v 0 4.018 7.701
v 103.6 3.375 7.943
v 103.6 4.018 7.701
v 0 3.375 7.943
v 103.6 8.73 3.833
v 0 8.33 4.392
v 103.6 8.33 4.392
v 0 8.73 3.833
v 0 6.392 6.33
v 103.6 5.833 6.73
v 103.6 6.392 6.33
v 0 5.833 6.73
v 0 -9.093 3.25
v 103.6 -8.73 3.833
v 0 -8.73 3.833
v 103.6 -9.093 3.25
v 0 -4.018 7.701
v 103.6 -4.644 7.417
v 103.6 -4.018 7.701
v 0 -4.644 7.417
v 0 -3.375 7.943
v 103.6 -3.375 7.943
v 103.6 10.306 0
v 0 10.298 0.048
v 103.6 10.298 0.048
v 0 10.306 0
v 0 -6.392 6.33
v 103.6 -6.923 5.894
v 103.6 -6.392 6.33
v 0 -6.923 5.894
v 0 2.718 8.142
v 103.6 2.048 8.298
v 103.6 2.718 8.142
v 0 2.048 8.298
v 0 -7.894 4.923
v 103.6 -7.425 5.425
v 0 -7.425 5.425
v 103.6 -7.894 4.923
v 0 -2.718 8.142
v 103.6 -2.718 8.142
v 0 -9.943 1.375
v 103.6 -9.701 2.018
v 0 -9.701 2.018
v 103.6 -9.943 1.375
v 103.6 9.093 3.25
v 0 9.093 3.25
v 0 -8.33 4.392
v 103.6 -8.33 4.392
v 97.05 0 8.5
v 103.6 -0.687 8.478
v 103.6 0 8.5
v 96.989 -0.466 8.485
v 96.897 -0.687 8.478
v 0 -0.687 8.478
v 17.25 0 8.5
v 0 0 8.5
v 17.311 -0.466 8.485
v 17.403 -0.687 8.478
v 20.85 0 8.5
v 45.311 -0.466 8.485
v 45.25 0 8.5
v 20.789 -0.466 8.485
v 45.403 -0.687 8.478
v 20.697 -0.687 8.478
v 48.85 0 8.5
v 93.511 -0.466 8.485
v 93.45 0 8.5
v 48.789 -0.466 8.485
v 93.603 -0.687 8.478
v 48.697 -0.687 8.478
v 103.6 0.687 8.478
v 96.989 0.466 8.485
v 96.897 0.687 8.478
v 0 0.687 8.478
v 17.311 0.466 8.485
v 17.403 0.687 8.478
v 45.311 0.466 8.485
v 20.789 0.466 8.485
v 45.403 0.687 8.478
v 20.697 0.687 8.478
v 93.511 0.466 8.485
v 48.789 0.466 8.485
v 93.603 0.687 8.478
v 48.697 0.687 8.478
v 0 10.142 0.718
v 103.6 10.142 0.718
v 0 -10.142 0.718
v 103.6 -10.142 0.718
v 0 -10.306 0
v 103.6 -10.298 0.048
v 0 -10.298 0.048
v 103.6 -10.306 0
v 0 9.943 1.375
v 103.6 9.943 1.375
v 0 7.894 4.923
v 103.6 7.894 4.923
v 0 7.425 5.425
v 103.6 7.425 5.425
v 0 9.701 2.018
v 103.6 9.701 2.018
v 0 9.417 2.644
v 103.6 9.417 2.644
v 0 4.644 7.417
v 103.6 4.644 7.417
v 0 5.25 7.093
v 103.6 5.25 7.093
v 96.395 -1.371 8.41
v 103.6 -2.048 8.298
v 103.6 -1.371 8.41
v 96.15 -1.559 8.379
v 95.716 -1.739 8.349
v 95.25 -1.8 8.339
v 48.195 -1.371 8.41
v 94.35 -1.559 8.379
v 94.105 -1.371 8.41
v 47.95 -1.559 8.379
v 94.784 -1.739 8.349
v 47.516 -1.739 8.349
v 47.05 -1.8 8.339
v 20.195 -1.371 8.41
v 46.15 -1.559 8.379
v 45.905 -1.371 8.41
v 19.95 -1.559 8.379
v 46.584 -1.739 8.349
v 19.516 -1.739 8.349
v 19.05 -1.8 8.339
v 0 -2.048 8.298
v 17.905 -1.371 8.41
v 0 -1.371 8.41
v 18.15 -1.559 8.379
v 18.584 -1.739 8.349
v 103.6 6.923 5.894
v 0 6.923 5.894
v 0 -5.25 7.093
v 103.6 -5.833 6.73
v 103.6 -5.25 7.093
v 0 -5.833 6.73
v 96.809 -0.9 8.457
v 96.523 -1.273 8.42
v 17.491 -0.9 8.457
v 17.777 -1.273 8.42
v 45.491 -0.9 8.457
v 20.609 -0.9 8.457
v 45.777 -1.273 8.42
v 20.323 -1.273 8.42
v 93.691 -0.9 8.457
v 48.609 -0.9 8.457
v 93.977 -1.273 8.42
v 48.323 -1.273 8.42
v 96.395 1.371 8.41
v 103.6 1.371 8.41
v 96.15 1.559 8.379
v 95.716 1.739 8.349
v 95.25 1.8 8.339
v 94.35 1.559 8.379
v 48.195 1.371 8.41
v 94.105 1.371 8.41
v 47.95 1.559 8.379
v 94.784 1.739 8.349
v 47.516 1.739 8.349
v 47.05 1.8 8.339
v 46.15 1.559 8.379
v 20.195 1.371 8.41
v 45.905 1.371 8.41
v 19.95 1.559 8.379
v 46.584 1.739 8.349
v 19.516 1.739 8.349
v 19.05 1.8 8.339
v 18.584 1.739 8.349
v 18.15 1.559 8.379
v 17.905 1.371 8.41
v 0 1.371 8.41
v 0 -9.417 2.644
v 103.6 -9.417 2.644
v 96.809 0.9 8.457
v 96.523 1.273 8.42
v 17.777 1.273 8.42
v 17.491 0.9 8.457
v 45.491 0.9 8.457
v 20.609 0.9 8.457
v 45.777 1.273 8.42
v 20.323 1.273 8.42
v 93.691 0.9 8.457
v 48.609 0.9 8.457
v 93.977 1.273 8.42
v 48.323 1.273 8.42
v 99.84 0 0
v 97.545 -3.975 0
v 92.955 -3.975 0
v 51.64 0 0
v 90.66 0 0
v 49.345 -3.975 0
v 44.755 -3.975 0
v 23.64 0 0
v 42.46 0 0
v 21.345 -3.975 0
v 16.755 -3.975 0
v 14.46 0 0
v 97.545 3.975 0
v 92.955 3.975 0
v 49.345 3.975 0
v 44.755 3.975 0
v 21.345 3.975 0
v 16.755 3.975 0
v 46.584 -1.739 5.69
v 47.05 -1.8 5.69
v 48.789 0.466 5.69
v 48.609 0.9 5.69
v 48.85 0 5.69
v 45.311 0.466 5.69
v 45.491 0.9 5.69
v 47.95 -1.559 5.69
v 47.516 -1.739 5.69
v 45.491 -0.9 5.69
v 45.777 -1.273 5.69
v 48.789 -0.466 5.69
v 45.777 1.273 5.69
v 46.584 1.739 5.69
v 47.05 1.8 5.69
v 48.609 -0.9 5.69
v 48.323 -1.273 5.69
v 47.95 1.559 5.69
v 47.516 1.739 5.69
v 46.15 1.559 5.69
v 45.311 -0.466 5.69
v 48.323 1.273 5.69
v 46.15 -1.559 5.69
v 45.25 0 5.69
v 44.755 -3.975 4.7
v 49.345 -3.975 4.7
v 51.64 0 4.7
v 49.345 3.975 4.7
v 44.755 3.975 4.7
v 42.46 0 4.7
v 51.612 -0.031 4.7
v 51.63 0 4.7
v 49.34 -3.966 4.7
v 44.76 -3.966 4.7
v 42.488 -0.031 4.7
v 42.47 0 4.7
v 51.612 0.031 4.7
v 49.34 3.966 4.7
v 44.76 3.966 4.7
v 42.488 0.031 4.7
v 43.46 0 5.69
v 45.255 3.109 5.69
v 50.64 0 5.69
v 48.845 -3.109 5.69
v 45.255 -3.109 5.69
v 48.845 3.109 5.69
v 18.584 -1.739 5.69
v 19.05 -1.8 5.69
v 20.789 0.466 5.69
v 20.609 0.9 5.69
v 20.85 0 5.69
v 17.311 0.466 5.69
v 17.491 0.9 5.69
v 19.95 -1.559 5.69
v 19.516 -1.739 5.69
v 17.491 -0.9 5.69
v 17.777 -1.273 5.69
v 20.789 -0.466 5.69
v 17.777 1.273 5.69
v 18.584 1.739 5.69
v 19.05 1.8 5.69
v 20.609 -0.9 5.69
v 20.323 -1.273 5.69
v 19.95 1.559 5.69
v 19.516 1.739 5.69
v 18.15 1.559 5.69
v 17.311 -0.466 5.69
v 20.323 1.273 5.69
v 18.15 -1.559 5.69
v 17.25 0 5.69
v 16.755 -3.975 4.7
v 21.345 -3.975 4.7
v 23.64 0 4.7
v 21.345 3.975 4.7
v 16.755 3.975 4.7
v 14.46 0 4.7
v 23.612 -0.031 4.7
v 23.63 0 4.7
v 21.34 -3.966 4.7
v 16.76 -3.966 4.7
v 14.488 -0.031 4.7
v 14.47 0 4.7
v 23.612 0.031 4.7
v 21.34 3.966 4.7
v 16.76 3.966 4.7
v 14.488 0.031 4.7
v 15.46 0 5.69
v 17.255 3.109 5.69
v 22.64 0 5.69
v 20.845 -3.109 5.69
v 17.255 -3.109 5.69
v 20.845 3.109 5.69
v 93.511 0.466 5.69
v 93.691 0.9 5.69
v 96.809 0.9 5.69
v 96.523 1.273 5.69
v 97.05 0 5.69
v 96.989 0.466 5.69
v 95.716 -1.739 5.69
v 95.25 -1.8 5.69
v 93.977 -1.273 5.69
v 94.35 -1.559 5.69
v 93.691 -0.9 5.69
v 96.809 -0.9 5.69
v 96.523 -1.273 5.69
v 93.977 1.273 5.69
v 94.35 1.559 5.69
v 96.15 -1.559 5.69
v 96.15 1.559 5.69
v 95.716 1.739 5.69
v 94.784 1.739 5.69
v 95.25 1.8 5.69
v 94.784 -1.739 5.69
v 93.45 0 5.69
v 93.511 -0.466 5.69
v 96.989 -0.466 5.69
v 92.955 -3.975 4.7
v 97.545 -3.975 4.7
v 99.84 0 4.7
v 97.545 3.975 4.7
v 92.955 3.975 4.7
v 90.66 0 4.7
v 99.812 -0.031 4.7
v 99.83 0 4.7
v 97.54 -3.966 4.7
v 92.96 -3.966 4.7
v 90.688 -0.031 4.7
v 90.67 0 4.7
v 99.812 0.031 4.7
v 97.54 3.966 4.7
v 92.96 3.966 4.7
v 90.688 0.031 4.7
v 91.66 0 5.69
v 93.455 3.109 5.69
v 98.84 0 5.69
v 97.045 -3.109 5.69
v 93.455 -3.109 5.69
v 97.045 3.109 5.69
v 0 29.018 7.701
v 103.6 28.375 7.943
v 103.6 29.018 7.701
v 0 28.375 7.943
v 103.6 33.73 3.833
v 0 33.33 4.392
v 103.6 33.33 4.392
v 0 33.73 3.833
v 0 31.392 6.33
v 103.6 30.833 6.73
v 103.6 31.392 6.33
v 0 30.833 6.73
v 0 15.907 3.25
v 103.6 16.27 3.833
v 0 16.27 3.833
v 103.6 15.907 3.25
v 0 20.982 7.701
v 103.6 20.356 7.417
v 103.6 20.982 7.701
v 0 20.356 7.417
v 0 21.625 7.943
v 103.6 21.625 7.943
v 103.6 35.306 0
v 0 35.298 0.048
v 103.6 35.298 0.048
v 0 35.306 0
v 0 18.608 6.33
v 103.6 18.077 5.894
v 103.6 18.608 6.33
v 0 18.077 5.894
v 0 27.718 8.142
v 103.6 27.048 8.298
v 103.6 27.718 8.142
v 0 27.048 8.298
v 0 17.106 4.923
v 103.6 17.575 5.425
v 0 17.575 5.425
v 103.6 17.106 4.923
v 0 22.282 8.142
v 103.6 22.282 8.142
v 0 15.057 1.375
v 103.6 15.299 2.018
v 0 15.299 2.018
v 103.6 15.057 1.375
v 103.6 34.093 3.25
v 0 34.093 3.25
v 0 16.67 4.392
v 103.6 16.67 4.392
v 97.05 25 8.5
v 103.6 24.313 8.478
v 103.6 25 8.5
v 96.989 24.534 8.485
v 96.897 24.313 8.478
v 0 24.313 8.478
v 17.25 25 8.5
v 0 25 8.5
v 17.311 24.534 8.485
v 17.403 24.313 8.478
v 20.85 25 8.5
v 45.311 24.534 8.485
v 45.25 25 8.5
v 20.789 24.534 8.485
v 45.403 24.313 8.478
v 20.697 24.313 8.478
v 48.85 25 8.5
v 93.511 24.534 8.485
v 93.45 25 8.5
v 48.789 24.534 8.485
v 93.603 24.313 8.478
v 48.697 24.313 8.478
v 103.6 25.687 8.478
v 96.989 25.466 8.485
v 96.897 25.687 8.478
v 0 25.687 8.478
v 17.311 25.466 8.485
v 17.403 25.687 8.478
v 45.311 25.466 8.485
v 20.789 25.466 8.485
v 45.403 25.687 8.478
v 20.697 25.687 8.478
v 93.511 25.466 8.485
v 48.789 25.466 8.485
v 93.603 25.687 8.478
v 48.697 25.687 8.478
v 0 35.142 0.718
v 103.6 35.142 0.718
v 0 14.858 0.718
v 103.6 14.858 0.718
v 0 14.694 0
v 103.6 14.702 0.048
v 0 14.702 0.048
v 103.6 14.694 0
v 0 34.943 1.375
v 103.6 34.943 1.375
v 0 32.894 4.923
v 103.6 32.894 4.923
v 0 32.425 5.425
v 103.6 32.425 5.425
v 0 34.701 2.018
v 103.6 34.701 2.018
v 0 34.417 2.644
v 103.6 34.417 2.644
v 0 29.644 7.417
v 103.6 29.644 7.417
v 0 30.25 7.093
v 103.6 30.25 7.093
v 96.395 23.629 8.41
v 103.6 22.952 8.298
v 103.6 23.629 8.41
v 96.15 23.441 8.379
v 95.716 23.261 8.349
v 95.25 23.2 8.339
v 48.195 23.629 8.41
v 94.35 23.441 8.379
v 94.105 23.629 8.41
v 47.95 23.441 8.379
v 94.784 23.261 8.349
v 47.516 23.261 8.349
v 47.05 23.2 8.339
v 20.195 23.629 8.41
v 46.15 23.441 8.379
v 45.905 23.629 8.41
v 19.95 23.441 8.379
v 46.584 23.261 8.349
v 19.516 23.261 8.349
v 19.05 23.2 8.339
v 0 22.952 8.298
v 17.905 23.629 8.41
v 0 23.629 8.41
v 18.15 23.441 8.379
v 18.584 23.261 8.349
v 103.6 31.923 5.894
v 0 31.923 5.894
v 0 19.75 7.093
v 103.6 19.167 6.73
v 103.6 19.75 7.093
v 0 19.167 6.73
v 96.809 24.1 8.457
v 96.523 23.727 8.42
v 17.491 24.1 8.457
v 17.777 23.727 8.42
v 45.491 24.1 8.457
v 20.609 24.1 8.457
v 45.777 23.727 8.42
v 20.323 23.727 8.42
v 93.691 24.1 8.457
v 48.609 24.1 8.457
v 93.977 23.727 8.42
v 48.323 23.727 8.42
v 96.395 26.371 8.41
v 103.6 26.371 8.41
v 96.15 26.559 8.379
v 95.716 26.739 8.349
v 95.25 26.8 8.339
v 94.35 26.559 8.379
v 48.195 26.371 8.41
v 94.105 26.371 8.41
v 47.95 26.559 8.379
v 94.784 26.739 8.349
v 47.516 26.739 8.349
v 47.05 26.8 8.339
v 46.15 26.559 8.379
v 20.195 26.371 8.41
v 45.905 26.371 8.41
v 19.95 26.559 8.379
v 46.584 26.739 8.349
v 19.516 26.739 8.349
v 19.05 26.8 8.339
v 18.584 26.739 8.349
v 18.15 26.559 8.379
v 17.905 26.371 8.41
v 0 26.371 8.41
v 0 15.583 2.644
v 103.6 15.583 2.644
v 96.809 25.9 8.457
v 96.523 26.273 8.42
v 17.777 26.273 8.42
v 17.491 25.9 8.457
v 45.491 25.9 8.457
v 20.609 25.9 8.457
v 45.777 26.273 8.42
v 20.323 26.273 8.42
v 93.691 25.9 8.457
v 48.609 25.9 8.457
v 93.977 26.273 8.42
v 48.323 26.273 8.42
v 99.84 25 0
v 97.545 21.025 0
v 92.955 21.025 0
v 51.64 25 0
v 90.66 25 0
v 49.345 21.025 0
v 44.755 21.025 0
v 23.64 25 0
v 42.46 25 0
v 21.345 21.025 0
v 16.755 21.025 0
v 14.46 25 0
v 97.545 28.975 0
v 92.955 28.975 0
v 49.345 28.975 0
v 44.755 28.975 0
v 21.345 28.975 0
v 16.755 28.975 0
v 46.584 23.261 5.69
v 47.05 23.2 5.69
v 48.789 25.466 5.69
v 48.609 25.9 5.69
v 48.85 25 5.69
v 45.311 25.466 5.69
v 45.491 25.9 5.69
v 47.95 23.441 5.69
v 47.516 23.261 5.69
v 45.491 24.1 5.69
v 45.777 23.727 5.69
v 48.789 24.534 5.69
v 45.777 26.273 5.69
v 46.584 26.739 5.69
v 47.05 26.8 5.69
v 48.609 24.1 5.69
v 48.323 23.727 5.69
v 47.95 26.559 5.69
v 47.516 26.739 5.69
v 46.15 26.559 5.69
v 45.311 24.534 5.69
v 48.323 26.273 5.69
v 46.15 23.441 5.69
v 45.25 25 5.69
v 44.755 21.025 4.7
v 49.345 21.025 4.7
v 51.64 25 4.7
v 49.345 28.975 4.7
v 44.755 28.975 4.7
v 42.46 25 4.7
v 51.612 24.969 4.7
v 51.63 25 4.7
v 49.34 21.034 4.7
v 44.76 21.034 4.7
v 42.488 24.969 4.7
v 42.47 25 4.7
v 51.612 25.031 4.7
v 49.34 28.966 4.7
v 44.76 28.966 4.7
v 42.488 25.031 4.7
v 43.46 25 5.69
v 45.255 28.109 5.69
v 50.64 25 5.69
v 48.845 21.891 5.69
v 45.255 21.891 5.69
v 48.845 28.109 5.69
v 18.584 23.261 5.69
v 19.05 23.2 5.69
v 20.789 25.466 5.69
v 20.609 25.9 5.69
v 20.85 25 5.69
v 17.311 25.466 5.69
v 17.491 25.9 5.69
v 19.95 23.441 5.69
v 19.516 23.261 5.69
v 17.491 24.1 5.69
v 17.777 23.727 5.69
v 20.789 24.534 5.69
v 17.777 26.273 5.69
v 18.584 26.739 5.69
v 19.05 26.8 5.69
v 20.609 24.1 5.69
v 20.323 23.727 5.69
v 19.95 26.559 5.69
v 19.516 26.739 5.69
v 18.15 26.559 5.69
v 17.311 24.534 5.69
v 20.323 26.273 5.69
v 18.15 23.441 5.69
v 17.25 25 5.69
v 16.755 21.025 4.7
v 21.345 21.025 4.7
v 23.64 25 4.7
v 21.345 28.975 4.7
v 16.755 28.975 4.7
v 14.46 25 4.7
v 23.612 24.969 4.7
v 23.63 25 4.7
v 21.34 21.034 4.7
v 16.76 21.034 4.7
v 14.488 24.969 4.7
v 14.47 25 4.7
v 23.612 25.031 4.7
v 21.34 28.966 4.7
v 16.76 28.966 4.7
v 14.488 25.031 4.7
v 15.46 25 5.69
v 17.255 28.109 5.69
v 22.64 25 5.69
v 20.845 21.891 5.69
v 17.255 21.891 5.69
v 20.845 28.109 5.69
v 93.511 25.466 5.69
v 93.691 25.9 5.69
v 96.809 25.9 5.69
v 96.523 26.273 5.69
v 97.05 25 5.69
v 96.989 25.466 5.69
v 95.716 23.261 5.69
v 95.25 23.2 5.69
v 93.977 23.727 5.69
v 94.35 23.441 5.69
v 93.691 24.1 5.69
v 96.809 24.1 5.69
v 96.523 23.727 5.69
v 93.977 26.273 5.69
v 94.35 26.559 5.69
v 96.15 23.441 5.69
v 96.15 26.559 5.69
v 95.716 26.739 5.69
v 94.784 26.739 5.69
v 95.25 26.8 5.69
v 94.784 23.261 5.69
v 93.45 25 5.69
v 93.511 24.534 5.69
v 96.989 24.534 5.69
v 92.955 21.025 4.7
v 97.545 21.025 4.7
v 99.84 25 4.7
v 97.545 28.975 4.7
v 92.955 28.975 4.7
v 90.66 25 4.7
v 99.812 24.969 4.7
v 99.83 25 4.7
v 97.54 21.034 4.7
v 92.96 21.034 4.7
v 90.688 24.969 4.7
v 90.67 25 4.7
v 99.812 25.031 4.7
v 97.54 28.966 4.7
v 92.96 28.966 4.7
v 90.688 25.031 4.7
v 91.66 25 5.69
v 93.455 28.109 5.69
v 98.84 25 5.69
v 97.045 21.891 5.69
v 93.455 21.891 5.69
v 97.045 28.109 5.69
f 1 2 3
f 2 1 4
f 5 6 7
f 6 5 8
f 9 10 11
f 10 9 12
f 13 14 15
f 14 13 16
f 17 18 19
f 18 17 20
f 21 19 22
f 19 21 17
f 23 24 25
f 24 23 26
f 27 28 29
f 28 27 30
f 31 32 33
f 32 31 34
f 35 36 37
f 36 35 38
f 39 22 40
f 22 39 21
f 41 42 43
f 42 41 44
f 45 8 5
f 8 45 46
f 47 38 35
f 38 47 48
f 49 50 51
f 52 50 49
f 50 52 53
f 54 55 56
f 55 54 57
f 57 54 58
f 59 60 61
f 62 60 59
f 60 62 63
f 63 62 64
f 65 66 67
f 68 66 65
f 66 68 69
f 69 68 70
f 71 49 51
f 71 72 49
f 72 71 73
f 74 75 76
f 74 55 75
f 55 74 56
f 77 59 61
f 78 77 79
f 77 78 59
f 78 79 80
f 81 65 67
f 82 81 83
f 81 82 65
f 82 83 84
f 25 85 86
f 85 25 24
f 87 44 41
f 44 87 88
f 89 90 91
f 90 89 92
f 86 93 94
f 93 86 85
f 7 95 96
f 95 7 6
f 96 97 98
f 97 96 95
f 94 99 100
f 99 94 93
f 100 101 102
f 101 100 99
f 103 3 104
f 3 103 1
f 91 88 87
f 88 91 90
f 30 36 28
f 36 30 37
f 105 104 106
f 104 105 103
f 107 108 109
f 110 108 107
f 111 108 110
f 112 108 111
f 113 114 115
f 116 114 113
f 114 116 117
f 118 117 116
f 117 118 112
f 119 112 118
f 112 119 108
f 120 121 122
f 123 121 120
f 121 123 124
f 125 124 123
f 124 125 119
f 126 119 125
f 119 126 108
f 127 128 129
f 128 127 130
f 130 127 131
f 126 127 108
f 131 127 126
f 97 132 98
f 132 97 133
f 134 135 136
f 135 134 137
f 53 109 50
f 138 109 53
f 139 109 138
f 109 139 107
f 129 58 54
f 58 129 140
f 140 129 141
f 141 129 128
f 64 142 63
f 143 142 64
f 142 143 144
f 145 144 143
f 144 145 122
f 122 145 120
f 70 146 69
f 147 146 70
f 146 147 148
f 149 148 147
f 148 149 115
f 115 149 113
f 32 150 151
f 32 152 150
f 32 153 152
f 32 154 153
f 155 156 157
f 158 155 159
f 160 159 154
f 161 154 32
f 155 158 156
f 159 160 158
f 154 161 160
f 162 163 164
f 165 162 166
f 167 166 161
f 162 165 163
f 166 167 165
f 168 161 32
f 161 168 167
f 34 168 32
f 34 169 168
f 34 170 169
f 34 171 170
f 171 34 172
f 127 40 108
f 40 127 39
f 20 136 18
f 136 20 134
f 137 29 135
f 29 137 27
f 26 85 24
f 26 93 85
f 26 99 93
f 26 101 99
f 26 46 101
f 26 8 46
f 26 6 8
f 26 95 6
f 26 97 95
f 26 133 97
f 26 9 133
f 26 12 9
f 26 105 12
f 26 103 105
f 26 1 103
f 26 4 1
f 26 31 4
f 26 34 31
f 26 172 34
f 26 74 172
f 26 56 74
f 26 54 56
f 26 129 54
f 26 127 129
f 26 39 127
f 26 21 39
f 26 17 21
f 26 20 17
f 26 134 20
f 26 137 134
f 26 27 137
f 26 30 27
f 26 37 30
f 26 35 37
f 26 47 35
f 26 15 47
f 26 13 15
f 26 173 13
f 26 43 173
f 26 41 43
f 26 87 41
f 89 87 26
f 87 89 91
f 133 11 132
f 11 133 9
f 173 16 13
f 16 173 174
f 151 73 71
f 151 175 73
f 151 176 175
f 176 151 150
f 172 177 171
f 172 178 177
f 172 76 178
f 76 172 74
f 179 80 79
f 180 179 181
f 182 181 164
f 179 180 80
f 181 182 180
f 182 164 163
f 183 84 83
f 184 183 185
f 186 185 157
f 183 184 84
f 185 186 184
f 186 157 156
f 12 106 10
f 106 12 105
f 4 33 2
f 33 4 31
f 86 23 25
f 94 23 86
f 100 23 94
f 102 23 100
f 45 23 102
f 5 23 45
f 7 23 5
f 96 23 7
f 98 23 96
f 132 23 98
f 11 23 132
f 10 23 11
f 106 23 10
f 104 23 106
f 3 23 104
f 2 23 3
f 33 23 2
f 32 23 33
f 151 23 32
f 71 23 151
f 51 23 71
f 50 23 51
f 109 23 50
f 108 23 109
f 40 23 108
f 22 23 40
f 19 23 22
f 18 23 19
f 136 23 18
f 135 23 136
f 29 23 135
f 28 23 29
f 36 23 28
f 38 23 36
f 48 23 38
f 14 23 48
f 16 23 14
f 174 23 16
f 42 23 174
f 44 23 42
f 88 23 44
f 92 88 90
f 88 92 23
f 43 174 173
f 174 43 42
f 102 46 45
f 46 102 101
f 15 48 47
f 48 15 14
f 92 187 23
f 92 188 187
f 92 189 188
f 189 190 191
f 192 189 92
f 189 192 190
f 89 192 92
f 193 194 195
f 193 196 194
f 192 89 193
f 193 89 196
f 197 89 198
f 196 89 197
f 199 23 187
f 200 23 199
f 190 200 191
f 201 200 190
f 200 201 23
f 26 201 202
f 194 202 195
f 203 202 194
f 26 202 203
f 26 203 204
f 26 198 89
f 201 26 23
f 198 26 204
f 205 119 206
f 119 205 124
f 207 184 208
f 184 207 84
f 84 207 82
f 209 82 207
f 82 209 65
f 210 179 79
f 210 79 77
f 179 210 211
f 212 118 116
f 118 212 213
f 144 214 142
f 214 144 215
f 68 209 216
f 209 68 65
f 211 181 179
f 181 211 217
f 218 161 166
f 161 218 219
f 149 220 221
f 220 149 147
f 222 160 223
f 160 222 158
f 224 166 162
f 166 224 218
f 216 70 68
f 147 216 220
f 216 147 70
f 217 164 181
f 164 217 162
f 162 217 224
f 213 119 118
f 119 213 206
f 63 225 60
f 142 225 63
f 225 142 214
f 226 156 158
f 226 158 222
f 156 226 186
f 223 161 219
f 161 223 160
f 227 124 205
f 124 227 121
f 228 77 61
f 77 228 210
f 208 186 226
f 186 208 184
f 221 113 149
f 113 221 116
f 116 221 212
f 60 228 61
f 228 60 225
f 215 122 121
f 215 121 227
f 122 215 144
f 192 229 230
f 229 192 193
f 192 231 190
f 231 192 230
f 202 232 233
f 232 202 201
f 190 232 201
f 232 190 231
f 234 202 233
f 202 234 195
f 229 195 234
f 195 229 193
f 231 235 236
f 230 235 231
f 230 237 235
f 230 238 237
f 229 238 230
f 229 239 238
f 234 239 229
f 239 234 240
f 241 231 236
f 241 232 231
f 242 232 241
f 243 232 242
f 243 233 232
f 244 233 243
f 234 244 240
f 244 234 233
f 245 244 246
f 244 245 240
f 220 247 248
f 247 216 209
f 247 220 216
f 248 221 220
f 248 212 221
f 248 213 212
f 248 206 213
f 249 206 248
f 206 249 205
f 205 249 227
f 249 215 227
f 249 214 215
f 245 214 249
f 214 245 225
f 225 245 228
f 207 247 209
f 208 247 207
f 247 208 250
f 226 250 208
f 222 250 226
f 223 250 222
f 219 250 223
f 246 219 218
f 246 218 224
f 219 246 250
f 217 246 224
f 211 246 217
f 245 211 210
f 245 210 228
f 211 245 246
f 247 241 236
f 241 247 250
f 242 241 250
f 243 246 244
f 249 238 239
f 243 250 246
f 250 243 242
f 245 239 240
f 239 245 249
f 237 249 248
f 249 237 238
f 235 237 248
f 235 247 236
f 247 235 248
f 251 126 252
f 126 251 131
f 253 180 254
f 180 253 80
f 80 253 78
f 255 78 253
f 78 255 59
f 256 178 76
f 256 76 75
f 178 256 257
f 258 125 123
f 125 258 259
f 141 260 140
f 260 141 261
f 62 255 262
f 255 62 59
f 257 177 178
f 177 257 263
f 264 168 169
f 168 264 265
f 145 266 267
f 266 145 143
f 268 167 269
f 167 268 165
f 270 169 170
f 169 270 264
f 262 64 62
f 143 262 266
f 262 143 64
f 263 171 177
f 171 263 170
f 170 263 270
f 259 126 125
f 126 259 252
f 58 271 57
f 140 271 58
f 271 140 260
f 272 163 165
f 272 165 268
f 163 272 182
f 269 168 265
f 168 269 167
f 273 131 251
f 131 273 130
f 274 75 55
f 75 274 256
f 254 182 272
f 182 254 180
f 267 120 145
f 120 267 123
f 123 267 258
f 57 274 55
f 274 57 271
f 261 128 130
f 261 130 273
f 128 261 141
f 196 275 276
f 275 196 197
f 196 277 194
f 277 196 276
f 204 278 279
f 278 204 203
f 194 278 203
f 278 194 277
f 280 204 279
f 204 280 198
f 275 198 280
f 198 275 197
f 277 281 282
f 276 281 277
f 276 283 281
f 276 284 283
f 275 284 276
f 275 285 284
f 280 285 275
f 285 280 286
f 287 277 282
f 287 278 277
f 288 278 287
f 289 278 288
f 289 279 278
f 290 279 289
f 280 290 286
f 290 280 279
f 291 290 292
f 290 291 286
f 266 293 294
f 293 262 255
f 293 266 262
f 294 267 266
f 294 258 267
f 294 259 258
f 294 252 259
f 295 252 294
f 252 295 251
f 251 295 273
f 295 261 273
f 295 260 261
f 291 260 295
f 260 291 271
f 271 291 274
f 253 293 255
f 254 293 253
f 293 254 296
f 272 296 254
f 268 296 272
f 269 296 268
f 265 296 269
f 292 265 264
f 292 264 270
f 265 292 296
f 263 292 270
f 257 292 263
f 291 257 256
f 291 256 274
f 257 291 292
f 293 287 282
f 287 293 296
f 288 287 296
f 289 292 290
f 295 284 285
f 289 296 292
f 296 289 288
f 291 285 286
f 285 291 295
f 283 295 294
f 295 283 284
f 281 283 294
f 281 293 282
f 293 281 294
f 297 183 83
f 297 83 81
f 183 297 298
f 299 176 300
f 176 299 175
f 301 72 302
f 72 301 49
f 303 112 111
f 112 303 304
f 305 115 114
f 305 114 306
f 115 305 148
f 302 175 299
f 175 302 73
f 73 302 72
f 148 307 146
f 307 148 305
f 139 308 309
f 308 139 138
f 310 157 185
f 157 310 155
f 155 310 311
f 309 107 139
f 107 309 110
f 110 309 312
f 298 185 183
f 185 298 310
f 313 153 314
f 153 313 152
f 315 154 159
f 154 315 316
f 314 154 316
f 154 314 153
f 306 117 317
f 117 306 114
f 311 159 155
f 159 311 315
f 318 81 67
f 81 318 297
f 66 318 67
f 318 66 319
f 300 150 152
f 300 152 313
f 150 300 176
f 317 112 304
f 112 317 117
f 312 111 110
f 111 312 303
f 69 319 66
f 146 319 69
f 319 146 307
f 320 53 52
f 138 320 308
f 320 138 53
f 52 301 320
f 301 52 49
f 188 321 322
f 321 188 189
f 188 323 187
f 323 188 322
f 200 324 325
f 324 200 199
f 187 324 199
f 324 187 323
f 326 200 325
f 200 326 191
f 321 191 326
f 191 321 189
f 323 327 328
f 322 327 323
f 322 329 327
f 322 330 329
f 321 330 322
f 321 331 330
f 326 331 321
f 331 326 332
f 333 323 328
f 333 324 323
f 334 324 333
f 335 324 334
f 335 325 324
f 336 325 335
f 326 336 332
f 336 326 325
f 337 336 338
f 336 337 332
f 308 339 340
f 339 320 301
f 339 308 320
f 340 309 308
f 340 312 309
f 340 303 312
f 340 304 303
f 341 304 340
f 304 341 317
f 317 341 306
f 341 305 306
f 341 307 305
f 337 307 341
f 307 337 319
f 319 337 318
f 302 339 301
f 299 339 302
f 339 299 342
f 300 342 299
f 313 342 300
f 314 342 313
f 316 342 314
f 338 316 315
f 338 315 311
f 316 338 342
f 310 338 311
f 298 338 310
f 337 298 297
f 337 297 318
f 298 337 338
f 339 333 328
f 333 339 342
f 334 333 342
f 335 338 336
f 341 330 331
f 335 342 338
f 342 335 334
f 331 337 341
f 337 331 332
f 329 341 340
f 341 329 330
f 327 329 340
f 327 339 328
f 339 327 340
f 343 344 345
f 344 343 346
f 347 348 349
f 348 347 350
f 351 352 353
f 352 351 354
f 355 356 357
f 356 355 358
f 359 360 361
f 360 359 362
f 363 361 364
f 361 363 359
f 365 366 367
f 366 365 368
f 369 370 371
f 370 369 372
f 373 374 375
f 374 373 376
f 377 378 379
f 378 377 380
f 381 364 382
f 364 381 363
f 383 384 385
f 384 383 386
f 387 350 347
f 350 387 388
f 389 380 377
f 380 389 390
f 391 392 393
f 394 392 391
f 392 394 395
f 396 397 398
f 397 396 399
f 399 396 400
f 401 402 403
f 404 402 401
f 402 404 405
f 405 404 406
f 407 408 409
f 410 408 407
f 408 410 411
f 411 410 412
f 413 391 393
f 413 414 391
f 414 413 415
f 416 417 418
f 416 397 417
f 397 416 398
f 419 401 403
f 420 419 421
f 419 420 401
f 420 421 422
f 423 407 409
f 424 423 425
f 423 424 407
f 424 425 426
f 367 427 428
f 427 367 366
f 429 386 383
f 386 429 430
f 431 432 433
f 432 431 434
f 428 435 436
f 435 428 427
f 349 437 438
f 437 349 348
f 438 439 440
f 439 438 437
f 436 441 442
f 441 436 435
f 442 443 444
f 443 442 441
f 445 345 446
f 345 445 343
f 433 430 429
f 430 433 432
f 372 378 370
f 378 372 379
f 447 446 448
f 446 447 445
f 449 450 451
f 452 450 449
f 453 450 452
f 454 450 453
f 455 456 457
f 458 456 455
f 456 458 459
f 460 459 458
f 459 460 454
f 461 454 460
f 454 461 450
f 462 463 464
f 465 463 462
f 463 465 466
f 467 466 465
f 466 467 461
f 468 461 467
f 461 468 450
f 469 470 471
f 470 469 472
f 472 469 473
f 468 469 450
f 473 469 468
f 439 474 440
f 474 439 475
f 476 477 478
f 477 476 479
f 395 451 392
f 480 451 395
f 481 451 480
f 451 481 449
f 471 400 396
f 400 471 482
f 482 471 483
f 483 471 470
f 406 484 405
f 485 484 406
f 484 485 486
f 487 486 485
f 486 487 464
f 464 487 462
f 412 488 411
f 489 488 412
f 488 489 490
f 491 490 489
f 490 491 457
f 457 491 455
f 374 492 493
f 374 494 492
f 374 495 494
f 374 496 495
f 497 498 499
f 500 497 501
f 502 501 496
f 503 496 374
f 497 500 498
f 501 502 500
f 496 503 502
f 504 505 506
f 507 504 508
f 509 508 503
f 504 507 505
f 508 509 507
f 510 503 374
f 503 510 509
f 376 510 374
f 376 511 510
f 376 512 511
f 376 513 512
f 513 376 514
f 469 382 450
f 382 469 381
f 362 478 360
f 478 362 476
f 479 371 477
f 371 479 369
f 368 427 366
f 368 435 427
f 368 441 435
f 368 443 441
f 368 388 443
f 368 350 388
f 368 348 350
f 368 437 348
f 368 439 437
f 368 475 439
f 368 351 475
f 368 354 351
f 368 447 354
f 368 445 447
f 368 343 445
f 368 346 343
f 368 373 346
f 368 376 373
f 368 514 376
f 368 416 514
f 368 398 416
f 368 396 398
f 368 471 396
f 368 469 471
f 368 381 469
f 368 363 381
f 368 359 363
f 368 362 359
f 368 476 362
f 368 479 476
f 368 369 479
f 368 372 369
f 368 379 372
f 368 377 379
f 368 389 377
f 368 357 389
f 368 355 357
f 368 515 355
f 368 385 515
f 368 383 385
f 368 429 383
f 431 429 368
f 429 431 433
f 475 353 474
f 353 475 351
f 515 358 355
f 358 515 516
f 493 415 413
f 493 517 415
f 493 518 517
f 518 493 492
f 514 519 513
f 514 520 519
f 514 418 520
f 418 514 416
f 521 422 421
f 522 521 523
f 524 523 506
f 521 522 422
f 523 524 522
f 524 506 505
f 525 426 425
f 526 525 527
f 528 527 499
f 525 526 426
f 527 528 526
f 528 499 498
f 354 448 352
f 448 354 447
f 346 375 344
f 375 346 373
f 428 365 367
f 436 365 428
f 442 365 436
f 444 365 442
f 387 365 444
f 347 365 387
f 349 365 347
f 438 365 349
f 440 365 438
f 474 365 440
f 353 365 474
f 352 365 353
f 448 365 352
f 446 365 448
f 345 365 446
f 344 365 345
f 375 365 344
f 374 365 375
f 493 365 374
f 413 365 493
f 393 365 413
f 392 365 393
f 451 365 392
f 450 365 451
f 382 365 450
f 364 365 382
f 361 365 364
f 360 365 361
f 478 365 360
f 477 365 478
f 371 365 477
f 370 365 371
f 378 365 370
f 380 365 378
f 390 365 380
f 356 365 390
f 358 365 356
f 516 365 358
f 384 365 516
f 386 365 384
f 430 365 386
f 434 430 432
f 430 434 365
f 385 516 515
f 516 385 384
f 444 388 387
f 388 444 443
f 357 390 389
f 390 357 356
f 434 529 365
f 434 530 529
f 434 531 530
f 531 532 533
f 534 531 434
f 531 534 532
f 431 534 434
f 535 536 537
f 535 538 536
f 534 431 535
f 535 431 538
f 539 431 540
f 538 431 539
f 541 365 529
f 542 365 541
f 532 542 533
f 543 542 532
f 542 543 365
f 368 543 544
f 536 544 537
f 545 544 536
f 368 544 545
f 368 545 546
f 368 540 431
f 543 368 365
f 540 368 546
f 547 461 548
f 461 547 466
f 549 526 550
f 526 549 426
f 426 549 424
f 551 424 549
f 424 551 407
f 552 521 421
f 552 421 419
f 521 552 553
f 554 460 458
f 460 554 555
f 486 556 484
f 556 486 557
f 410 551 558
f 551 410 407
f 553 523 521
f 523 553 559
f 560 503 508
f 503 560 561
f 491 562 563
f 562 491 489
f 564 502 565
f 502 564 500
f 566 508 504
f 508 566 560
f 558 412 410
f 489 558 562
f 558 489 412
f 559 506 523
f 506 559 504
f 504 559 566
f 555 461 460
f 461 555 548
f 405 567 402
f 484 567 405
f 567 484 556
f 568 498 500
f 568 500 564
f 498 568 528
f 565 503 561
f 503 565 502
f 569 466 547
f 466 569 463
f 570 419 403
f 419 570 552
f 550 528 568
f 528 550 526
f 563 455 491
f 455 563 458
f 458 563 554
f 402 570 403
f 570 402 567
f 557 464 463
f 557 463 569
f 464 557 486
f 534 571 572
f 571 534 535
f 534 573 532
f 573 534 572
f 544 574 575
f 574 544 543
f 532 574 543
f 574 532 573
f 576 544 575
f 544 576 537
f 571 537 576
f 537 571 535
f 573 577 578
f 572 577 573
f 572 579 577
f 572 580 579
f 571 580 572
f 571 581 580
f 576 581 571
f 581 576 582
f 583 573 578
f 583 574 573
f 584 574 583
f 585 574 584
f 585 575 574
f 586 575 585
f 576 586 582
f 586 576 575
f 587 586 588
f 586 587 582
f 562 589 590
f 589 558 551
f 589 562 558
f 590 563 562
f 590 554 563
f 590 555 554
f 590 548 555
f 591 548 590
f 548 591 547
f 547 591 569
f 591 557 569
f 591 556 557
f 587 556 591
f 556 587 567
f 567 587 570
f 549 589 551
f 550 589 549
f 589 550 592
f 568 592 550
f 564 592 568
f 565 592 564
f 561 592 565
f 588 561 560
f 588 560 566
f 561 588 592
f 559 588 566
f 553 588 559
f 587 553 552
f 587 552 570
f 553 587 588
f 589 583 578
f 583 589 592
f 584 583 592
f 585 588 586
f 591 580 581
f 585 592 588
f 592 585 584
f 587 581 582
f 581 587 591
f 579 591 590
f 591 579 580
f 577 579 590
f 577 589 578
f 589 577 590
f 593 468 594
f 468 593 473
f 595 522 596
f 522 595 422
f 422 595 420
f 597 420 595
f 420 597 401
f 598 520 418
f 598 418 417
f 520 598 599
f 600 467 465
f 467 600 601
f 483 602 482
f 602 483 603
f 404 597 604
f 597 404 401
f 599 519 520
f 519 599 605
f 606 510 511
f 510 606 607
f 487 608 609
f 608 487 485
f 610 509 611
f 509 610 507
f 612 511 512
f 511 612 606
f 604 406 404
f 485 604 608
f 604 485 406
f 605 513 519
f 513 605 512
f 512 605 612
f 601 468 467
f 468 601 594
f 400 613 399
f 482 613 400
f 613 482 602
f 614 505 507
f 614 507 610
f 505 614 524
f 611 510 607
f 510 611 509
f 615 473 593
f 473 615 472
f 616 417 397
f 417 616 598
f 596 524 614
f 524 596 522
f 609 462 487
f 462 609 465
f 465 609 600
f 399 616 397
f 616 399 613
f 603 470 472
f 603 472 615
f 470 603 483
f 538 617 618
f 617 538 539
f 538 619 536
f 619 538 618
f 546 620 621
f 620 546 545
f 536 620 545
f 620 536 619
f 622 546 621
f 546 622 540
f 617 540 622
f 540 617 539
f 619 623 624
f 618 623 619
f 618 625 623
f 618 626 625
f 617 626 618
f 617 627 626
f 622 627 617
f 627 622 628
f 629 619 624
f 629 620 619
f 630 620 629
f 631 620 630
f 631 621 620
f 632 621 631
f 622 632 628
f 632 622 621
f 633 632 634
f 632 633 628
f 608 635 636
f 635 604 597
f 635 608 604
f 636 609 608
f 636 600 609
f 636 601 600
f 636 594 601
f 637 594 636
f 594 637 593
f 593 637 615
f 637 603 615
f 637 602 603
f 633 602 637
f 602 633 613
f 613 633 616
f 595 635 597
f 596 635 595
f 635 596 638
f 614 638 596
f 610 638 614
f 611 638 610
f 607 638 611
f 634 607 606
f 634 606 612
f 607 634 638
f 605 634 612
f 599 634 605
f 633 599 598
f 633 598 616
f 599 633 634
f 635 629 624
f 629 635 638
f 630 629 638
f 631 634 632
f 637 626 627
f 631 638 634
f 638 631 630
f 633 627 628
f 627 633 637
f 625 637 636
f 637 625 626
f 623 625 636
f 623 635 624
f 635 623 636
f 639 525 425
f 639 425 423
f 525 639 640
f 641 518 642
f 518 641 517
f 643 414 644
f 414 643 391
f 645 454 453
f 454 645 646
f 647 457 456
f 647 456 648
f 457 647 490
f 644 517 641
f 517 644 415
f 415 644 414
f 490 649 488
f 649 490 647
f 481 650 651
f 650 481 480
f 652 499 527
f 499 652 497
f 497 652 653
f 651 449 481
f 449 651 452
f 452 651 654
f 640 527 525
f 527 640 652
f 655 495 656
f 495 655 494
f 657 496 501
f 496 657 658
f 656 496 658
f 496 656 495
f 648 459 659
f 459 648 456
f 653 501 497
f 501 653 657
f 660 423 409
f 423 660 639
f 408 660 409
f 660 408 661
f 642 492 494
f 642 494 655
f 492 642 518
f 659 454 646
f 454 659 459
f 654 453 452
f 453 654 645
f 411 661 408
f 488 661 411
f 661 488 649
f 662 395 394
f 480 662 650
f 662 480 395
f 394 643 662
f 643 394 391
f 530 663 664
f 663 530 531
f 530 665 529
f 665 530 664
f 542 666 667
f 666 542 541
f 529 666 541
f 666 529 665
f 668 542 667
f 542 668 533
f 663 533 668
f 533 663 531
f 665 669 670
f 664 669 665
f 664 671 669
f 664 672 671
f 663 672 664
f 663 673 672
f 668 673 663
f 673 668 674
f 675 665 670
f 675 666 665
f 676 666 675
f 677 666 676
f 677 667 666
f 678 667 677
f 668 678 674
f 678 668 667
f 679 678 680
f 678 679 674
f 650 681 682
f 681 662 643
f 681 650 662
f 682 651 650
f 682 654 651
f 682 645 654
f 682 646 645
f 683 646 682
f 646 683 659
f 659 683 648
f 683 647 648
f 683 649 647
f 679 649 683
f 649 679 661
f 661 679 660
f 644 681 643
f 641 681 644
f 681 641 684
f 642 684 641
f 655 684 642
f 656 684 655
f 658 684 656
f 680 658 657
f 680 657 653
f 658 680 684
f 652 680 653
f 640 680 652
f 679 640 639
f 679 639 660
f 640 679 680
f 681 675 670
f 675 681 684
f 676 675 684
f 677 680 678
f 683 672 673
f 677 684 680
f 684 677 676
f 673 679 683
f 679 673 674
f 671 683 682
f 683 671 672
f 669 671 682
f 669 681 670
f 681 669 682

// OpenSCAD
//Parametric Nut trap for Mostly Printed CNC Router
//July 7,2015 By: David Bunch
//
//Revised 9/21/2015 to allow for 3 nuts
//I needed to make a length that would fit with my customized tool holder for
//a Mastergrip rotary tool I bought at Costco years ago, so I decided to make it parametric.
//Spacing for my tool holder is 53mm distance between holes

//Even though this is for the U.S. Standard Version, I use mm for dimensions
//
//Designed for Bosch Toolholder with Dust cover using 2 parts
//76.25mm 1st & 3rd hole
//28.01mm 1st & 2nd hole
//48.24mm 2nd & 3rd hole

//CUSTOMIZER VARIABLES

//1. Number of Nuts
NumNuts = 3;    //usually 2, but need 3 for Bosch with Vac attachment

//2. Spacing between 1st & Last Nut
NutSpacing=76.2;     //mm spacing between Nuts (original design seems to be 76.2mm)

//3. Spacing between 1st & 2nd Nut
NutSpacing2 = 28;    //Use 0 if only using 2 nuts

//4. Diameter of Nut Holder (21mm is U.S. Version Size)
THNT_Dia=21;      //Dia Tool Holder Nut Trap

//5. Resolution of Nut Holder (96 gives you about .7mm length segments in curve)
ires=96;    //Number of  segments for Tool Holder
                    //Circumference of 21mm Dia circle is 65.97
                    //Making each segment about .7mm will give you 96 for the number of sides

//6. Diameter of Bolt Threading
M3Dia=3.6;             //Dia. of Hole

//7. Resolution of Bolt Threads (24 gives .47mm length segments in curve)
M3_ires=24;         //Number of segments for M3 holes (.47mm segments)
                    //original design was 180 sides (.06mm segments)
//8. Diameter of Nut
M3NutDia=9.18;

//9. Height of Nut trap
M3Nut_Ht=4.7;

//10. Offset from Left for 1st Nut Trap
LtNutOffset=19.05;      //Original Design is 19.05mm

//11. Offset from Right of 2nd Nut Trap (Original is 6.35mm)
RtNutOffset=8.35;       //(I decided to add 2mm to this gap)

//12. Rotation of Nut Trap (0 = Original or 30 = Nut face parallel with End)
RotNut=0;	//	[0:Original, 30:parallel with End]

//13. Print 1 or 2 Nut Traps
Qty=2;

//14. Change this number to make it thicker or thinner
Z_Origin=-2;      //Z origin of Nut trap profile cylinder to extrude
//CUSTOMIZER VARIABLES END

//----------------------------------------

Len=LtNutOffset+RtNutOffset+NutSpacing;     //Total Length of Nut Trap
echo("Len = ",Len);
RtNut_X=Len-RtNutOffset;
//Len=101.6;   //Original Tool Holder Nut Trap length was 101.6
Cube_z=(Z_Origin + 30)* (-1);
module Base()
{
    difference()
    {
        translate([0,0,Z_Origin])
        rotate([0,90,0])
        cylinder(d=THNT_Dia,h=Len,$fn=ires);
        translate([-1,-15,-30])
        cube([Len+2,30,30]);
    }
}
module DrawFinal()
{
    difference()
    {
        Base();
//Drill the Left Bolt Hole
        translate([LtNutOffset,0,-1])
        cylinder(d=M3Dia,h=12,$fn=M3_ires);
        if (NumNuts == 3)
        {
            if (NutSpacing2 > 0)
            {
                translate([LtNutOffset+NutSpacing2,0,-1])
                cylinder(d=M3Dia,h=12,$fn=M3_ires);
                translate([LtNutOffset+NutSpacing2,0,-1])
        rotate([0,0,RotNut])
                cylinder(d=M3NutDia,h=M3Nut_Ht+1,$fn=6);
                translate([LtNutOffset+NutSpacing2,0,M3Nut_Ht-.01])
        rotate([0,0,RotNut])            //Rotate Nut either 0 or 30
        cylinder(d1=M3NutDia,d2=M3NutDia-2,h=1,$fn=6);
            }
        }
//Cut Left Nut Trap
        translate([LtNutOffset,0,-1])
        rotate([0,0,RotNut])            //Rotate Nut either 0 or 30
                                        //rotating 30 gives more plastic between Nut and end
        cylinder(d=M3NutDia,h=M3Nut_Ht+1,$fn=6);        //6 sided Nut trap hole
        translate([LtNutOffset,0,M3Nut_Ht-.01])
        rotate([0,0,RotNut])            //Rotate Nut either 0 or 30
        cylinder(d1=M3NutDia,d2=M3NutDia-2,h=1,$fn=6);  //Add slight taper for nut hole
//Drill the Right Bolt Hole
        translate([RtNut_X,0,-1])
        cylinder(d=M3Dia,h=12,$fn=M3_ires);
//Cut Right Nut Trap
        translate([RtNut_X,0,-1])
        rotate([0,0,RotNut])            //Rotate Nut either 0 or 30
        cylinder(d=M3NutDia,h=M3Nut_Ht+1,$fn=6);        //6 sided Nut trap hole
        translate([RtNut_X,0,M3Nut_Ht-.01])
        rotate([0,0,RotNut])            //Rotate Nut either 0 or 30
        cylinder(d1=M3NutDia,d2=M3NutDia-2,h=1,$fn=6);  //Add slight taper for nut hole
    }
}
DrawFinal();
if (Qty == 2)
{
    translate([0,25,0])
    DrawFinal();
}
